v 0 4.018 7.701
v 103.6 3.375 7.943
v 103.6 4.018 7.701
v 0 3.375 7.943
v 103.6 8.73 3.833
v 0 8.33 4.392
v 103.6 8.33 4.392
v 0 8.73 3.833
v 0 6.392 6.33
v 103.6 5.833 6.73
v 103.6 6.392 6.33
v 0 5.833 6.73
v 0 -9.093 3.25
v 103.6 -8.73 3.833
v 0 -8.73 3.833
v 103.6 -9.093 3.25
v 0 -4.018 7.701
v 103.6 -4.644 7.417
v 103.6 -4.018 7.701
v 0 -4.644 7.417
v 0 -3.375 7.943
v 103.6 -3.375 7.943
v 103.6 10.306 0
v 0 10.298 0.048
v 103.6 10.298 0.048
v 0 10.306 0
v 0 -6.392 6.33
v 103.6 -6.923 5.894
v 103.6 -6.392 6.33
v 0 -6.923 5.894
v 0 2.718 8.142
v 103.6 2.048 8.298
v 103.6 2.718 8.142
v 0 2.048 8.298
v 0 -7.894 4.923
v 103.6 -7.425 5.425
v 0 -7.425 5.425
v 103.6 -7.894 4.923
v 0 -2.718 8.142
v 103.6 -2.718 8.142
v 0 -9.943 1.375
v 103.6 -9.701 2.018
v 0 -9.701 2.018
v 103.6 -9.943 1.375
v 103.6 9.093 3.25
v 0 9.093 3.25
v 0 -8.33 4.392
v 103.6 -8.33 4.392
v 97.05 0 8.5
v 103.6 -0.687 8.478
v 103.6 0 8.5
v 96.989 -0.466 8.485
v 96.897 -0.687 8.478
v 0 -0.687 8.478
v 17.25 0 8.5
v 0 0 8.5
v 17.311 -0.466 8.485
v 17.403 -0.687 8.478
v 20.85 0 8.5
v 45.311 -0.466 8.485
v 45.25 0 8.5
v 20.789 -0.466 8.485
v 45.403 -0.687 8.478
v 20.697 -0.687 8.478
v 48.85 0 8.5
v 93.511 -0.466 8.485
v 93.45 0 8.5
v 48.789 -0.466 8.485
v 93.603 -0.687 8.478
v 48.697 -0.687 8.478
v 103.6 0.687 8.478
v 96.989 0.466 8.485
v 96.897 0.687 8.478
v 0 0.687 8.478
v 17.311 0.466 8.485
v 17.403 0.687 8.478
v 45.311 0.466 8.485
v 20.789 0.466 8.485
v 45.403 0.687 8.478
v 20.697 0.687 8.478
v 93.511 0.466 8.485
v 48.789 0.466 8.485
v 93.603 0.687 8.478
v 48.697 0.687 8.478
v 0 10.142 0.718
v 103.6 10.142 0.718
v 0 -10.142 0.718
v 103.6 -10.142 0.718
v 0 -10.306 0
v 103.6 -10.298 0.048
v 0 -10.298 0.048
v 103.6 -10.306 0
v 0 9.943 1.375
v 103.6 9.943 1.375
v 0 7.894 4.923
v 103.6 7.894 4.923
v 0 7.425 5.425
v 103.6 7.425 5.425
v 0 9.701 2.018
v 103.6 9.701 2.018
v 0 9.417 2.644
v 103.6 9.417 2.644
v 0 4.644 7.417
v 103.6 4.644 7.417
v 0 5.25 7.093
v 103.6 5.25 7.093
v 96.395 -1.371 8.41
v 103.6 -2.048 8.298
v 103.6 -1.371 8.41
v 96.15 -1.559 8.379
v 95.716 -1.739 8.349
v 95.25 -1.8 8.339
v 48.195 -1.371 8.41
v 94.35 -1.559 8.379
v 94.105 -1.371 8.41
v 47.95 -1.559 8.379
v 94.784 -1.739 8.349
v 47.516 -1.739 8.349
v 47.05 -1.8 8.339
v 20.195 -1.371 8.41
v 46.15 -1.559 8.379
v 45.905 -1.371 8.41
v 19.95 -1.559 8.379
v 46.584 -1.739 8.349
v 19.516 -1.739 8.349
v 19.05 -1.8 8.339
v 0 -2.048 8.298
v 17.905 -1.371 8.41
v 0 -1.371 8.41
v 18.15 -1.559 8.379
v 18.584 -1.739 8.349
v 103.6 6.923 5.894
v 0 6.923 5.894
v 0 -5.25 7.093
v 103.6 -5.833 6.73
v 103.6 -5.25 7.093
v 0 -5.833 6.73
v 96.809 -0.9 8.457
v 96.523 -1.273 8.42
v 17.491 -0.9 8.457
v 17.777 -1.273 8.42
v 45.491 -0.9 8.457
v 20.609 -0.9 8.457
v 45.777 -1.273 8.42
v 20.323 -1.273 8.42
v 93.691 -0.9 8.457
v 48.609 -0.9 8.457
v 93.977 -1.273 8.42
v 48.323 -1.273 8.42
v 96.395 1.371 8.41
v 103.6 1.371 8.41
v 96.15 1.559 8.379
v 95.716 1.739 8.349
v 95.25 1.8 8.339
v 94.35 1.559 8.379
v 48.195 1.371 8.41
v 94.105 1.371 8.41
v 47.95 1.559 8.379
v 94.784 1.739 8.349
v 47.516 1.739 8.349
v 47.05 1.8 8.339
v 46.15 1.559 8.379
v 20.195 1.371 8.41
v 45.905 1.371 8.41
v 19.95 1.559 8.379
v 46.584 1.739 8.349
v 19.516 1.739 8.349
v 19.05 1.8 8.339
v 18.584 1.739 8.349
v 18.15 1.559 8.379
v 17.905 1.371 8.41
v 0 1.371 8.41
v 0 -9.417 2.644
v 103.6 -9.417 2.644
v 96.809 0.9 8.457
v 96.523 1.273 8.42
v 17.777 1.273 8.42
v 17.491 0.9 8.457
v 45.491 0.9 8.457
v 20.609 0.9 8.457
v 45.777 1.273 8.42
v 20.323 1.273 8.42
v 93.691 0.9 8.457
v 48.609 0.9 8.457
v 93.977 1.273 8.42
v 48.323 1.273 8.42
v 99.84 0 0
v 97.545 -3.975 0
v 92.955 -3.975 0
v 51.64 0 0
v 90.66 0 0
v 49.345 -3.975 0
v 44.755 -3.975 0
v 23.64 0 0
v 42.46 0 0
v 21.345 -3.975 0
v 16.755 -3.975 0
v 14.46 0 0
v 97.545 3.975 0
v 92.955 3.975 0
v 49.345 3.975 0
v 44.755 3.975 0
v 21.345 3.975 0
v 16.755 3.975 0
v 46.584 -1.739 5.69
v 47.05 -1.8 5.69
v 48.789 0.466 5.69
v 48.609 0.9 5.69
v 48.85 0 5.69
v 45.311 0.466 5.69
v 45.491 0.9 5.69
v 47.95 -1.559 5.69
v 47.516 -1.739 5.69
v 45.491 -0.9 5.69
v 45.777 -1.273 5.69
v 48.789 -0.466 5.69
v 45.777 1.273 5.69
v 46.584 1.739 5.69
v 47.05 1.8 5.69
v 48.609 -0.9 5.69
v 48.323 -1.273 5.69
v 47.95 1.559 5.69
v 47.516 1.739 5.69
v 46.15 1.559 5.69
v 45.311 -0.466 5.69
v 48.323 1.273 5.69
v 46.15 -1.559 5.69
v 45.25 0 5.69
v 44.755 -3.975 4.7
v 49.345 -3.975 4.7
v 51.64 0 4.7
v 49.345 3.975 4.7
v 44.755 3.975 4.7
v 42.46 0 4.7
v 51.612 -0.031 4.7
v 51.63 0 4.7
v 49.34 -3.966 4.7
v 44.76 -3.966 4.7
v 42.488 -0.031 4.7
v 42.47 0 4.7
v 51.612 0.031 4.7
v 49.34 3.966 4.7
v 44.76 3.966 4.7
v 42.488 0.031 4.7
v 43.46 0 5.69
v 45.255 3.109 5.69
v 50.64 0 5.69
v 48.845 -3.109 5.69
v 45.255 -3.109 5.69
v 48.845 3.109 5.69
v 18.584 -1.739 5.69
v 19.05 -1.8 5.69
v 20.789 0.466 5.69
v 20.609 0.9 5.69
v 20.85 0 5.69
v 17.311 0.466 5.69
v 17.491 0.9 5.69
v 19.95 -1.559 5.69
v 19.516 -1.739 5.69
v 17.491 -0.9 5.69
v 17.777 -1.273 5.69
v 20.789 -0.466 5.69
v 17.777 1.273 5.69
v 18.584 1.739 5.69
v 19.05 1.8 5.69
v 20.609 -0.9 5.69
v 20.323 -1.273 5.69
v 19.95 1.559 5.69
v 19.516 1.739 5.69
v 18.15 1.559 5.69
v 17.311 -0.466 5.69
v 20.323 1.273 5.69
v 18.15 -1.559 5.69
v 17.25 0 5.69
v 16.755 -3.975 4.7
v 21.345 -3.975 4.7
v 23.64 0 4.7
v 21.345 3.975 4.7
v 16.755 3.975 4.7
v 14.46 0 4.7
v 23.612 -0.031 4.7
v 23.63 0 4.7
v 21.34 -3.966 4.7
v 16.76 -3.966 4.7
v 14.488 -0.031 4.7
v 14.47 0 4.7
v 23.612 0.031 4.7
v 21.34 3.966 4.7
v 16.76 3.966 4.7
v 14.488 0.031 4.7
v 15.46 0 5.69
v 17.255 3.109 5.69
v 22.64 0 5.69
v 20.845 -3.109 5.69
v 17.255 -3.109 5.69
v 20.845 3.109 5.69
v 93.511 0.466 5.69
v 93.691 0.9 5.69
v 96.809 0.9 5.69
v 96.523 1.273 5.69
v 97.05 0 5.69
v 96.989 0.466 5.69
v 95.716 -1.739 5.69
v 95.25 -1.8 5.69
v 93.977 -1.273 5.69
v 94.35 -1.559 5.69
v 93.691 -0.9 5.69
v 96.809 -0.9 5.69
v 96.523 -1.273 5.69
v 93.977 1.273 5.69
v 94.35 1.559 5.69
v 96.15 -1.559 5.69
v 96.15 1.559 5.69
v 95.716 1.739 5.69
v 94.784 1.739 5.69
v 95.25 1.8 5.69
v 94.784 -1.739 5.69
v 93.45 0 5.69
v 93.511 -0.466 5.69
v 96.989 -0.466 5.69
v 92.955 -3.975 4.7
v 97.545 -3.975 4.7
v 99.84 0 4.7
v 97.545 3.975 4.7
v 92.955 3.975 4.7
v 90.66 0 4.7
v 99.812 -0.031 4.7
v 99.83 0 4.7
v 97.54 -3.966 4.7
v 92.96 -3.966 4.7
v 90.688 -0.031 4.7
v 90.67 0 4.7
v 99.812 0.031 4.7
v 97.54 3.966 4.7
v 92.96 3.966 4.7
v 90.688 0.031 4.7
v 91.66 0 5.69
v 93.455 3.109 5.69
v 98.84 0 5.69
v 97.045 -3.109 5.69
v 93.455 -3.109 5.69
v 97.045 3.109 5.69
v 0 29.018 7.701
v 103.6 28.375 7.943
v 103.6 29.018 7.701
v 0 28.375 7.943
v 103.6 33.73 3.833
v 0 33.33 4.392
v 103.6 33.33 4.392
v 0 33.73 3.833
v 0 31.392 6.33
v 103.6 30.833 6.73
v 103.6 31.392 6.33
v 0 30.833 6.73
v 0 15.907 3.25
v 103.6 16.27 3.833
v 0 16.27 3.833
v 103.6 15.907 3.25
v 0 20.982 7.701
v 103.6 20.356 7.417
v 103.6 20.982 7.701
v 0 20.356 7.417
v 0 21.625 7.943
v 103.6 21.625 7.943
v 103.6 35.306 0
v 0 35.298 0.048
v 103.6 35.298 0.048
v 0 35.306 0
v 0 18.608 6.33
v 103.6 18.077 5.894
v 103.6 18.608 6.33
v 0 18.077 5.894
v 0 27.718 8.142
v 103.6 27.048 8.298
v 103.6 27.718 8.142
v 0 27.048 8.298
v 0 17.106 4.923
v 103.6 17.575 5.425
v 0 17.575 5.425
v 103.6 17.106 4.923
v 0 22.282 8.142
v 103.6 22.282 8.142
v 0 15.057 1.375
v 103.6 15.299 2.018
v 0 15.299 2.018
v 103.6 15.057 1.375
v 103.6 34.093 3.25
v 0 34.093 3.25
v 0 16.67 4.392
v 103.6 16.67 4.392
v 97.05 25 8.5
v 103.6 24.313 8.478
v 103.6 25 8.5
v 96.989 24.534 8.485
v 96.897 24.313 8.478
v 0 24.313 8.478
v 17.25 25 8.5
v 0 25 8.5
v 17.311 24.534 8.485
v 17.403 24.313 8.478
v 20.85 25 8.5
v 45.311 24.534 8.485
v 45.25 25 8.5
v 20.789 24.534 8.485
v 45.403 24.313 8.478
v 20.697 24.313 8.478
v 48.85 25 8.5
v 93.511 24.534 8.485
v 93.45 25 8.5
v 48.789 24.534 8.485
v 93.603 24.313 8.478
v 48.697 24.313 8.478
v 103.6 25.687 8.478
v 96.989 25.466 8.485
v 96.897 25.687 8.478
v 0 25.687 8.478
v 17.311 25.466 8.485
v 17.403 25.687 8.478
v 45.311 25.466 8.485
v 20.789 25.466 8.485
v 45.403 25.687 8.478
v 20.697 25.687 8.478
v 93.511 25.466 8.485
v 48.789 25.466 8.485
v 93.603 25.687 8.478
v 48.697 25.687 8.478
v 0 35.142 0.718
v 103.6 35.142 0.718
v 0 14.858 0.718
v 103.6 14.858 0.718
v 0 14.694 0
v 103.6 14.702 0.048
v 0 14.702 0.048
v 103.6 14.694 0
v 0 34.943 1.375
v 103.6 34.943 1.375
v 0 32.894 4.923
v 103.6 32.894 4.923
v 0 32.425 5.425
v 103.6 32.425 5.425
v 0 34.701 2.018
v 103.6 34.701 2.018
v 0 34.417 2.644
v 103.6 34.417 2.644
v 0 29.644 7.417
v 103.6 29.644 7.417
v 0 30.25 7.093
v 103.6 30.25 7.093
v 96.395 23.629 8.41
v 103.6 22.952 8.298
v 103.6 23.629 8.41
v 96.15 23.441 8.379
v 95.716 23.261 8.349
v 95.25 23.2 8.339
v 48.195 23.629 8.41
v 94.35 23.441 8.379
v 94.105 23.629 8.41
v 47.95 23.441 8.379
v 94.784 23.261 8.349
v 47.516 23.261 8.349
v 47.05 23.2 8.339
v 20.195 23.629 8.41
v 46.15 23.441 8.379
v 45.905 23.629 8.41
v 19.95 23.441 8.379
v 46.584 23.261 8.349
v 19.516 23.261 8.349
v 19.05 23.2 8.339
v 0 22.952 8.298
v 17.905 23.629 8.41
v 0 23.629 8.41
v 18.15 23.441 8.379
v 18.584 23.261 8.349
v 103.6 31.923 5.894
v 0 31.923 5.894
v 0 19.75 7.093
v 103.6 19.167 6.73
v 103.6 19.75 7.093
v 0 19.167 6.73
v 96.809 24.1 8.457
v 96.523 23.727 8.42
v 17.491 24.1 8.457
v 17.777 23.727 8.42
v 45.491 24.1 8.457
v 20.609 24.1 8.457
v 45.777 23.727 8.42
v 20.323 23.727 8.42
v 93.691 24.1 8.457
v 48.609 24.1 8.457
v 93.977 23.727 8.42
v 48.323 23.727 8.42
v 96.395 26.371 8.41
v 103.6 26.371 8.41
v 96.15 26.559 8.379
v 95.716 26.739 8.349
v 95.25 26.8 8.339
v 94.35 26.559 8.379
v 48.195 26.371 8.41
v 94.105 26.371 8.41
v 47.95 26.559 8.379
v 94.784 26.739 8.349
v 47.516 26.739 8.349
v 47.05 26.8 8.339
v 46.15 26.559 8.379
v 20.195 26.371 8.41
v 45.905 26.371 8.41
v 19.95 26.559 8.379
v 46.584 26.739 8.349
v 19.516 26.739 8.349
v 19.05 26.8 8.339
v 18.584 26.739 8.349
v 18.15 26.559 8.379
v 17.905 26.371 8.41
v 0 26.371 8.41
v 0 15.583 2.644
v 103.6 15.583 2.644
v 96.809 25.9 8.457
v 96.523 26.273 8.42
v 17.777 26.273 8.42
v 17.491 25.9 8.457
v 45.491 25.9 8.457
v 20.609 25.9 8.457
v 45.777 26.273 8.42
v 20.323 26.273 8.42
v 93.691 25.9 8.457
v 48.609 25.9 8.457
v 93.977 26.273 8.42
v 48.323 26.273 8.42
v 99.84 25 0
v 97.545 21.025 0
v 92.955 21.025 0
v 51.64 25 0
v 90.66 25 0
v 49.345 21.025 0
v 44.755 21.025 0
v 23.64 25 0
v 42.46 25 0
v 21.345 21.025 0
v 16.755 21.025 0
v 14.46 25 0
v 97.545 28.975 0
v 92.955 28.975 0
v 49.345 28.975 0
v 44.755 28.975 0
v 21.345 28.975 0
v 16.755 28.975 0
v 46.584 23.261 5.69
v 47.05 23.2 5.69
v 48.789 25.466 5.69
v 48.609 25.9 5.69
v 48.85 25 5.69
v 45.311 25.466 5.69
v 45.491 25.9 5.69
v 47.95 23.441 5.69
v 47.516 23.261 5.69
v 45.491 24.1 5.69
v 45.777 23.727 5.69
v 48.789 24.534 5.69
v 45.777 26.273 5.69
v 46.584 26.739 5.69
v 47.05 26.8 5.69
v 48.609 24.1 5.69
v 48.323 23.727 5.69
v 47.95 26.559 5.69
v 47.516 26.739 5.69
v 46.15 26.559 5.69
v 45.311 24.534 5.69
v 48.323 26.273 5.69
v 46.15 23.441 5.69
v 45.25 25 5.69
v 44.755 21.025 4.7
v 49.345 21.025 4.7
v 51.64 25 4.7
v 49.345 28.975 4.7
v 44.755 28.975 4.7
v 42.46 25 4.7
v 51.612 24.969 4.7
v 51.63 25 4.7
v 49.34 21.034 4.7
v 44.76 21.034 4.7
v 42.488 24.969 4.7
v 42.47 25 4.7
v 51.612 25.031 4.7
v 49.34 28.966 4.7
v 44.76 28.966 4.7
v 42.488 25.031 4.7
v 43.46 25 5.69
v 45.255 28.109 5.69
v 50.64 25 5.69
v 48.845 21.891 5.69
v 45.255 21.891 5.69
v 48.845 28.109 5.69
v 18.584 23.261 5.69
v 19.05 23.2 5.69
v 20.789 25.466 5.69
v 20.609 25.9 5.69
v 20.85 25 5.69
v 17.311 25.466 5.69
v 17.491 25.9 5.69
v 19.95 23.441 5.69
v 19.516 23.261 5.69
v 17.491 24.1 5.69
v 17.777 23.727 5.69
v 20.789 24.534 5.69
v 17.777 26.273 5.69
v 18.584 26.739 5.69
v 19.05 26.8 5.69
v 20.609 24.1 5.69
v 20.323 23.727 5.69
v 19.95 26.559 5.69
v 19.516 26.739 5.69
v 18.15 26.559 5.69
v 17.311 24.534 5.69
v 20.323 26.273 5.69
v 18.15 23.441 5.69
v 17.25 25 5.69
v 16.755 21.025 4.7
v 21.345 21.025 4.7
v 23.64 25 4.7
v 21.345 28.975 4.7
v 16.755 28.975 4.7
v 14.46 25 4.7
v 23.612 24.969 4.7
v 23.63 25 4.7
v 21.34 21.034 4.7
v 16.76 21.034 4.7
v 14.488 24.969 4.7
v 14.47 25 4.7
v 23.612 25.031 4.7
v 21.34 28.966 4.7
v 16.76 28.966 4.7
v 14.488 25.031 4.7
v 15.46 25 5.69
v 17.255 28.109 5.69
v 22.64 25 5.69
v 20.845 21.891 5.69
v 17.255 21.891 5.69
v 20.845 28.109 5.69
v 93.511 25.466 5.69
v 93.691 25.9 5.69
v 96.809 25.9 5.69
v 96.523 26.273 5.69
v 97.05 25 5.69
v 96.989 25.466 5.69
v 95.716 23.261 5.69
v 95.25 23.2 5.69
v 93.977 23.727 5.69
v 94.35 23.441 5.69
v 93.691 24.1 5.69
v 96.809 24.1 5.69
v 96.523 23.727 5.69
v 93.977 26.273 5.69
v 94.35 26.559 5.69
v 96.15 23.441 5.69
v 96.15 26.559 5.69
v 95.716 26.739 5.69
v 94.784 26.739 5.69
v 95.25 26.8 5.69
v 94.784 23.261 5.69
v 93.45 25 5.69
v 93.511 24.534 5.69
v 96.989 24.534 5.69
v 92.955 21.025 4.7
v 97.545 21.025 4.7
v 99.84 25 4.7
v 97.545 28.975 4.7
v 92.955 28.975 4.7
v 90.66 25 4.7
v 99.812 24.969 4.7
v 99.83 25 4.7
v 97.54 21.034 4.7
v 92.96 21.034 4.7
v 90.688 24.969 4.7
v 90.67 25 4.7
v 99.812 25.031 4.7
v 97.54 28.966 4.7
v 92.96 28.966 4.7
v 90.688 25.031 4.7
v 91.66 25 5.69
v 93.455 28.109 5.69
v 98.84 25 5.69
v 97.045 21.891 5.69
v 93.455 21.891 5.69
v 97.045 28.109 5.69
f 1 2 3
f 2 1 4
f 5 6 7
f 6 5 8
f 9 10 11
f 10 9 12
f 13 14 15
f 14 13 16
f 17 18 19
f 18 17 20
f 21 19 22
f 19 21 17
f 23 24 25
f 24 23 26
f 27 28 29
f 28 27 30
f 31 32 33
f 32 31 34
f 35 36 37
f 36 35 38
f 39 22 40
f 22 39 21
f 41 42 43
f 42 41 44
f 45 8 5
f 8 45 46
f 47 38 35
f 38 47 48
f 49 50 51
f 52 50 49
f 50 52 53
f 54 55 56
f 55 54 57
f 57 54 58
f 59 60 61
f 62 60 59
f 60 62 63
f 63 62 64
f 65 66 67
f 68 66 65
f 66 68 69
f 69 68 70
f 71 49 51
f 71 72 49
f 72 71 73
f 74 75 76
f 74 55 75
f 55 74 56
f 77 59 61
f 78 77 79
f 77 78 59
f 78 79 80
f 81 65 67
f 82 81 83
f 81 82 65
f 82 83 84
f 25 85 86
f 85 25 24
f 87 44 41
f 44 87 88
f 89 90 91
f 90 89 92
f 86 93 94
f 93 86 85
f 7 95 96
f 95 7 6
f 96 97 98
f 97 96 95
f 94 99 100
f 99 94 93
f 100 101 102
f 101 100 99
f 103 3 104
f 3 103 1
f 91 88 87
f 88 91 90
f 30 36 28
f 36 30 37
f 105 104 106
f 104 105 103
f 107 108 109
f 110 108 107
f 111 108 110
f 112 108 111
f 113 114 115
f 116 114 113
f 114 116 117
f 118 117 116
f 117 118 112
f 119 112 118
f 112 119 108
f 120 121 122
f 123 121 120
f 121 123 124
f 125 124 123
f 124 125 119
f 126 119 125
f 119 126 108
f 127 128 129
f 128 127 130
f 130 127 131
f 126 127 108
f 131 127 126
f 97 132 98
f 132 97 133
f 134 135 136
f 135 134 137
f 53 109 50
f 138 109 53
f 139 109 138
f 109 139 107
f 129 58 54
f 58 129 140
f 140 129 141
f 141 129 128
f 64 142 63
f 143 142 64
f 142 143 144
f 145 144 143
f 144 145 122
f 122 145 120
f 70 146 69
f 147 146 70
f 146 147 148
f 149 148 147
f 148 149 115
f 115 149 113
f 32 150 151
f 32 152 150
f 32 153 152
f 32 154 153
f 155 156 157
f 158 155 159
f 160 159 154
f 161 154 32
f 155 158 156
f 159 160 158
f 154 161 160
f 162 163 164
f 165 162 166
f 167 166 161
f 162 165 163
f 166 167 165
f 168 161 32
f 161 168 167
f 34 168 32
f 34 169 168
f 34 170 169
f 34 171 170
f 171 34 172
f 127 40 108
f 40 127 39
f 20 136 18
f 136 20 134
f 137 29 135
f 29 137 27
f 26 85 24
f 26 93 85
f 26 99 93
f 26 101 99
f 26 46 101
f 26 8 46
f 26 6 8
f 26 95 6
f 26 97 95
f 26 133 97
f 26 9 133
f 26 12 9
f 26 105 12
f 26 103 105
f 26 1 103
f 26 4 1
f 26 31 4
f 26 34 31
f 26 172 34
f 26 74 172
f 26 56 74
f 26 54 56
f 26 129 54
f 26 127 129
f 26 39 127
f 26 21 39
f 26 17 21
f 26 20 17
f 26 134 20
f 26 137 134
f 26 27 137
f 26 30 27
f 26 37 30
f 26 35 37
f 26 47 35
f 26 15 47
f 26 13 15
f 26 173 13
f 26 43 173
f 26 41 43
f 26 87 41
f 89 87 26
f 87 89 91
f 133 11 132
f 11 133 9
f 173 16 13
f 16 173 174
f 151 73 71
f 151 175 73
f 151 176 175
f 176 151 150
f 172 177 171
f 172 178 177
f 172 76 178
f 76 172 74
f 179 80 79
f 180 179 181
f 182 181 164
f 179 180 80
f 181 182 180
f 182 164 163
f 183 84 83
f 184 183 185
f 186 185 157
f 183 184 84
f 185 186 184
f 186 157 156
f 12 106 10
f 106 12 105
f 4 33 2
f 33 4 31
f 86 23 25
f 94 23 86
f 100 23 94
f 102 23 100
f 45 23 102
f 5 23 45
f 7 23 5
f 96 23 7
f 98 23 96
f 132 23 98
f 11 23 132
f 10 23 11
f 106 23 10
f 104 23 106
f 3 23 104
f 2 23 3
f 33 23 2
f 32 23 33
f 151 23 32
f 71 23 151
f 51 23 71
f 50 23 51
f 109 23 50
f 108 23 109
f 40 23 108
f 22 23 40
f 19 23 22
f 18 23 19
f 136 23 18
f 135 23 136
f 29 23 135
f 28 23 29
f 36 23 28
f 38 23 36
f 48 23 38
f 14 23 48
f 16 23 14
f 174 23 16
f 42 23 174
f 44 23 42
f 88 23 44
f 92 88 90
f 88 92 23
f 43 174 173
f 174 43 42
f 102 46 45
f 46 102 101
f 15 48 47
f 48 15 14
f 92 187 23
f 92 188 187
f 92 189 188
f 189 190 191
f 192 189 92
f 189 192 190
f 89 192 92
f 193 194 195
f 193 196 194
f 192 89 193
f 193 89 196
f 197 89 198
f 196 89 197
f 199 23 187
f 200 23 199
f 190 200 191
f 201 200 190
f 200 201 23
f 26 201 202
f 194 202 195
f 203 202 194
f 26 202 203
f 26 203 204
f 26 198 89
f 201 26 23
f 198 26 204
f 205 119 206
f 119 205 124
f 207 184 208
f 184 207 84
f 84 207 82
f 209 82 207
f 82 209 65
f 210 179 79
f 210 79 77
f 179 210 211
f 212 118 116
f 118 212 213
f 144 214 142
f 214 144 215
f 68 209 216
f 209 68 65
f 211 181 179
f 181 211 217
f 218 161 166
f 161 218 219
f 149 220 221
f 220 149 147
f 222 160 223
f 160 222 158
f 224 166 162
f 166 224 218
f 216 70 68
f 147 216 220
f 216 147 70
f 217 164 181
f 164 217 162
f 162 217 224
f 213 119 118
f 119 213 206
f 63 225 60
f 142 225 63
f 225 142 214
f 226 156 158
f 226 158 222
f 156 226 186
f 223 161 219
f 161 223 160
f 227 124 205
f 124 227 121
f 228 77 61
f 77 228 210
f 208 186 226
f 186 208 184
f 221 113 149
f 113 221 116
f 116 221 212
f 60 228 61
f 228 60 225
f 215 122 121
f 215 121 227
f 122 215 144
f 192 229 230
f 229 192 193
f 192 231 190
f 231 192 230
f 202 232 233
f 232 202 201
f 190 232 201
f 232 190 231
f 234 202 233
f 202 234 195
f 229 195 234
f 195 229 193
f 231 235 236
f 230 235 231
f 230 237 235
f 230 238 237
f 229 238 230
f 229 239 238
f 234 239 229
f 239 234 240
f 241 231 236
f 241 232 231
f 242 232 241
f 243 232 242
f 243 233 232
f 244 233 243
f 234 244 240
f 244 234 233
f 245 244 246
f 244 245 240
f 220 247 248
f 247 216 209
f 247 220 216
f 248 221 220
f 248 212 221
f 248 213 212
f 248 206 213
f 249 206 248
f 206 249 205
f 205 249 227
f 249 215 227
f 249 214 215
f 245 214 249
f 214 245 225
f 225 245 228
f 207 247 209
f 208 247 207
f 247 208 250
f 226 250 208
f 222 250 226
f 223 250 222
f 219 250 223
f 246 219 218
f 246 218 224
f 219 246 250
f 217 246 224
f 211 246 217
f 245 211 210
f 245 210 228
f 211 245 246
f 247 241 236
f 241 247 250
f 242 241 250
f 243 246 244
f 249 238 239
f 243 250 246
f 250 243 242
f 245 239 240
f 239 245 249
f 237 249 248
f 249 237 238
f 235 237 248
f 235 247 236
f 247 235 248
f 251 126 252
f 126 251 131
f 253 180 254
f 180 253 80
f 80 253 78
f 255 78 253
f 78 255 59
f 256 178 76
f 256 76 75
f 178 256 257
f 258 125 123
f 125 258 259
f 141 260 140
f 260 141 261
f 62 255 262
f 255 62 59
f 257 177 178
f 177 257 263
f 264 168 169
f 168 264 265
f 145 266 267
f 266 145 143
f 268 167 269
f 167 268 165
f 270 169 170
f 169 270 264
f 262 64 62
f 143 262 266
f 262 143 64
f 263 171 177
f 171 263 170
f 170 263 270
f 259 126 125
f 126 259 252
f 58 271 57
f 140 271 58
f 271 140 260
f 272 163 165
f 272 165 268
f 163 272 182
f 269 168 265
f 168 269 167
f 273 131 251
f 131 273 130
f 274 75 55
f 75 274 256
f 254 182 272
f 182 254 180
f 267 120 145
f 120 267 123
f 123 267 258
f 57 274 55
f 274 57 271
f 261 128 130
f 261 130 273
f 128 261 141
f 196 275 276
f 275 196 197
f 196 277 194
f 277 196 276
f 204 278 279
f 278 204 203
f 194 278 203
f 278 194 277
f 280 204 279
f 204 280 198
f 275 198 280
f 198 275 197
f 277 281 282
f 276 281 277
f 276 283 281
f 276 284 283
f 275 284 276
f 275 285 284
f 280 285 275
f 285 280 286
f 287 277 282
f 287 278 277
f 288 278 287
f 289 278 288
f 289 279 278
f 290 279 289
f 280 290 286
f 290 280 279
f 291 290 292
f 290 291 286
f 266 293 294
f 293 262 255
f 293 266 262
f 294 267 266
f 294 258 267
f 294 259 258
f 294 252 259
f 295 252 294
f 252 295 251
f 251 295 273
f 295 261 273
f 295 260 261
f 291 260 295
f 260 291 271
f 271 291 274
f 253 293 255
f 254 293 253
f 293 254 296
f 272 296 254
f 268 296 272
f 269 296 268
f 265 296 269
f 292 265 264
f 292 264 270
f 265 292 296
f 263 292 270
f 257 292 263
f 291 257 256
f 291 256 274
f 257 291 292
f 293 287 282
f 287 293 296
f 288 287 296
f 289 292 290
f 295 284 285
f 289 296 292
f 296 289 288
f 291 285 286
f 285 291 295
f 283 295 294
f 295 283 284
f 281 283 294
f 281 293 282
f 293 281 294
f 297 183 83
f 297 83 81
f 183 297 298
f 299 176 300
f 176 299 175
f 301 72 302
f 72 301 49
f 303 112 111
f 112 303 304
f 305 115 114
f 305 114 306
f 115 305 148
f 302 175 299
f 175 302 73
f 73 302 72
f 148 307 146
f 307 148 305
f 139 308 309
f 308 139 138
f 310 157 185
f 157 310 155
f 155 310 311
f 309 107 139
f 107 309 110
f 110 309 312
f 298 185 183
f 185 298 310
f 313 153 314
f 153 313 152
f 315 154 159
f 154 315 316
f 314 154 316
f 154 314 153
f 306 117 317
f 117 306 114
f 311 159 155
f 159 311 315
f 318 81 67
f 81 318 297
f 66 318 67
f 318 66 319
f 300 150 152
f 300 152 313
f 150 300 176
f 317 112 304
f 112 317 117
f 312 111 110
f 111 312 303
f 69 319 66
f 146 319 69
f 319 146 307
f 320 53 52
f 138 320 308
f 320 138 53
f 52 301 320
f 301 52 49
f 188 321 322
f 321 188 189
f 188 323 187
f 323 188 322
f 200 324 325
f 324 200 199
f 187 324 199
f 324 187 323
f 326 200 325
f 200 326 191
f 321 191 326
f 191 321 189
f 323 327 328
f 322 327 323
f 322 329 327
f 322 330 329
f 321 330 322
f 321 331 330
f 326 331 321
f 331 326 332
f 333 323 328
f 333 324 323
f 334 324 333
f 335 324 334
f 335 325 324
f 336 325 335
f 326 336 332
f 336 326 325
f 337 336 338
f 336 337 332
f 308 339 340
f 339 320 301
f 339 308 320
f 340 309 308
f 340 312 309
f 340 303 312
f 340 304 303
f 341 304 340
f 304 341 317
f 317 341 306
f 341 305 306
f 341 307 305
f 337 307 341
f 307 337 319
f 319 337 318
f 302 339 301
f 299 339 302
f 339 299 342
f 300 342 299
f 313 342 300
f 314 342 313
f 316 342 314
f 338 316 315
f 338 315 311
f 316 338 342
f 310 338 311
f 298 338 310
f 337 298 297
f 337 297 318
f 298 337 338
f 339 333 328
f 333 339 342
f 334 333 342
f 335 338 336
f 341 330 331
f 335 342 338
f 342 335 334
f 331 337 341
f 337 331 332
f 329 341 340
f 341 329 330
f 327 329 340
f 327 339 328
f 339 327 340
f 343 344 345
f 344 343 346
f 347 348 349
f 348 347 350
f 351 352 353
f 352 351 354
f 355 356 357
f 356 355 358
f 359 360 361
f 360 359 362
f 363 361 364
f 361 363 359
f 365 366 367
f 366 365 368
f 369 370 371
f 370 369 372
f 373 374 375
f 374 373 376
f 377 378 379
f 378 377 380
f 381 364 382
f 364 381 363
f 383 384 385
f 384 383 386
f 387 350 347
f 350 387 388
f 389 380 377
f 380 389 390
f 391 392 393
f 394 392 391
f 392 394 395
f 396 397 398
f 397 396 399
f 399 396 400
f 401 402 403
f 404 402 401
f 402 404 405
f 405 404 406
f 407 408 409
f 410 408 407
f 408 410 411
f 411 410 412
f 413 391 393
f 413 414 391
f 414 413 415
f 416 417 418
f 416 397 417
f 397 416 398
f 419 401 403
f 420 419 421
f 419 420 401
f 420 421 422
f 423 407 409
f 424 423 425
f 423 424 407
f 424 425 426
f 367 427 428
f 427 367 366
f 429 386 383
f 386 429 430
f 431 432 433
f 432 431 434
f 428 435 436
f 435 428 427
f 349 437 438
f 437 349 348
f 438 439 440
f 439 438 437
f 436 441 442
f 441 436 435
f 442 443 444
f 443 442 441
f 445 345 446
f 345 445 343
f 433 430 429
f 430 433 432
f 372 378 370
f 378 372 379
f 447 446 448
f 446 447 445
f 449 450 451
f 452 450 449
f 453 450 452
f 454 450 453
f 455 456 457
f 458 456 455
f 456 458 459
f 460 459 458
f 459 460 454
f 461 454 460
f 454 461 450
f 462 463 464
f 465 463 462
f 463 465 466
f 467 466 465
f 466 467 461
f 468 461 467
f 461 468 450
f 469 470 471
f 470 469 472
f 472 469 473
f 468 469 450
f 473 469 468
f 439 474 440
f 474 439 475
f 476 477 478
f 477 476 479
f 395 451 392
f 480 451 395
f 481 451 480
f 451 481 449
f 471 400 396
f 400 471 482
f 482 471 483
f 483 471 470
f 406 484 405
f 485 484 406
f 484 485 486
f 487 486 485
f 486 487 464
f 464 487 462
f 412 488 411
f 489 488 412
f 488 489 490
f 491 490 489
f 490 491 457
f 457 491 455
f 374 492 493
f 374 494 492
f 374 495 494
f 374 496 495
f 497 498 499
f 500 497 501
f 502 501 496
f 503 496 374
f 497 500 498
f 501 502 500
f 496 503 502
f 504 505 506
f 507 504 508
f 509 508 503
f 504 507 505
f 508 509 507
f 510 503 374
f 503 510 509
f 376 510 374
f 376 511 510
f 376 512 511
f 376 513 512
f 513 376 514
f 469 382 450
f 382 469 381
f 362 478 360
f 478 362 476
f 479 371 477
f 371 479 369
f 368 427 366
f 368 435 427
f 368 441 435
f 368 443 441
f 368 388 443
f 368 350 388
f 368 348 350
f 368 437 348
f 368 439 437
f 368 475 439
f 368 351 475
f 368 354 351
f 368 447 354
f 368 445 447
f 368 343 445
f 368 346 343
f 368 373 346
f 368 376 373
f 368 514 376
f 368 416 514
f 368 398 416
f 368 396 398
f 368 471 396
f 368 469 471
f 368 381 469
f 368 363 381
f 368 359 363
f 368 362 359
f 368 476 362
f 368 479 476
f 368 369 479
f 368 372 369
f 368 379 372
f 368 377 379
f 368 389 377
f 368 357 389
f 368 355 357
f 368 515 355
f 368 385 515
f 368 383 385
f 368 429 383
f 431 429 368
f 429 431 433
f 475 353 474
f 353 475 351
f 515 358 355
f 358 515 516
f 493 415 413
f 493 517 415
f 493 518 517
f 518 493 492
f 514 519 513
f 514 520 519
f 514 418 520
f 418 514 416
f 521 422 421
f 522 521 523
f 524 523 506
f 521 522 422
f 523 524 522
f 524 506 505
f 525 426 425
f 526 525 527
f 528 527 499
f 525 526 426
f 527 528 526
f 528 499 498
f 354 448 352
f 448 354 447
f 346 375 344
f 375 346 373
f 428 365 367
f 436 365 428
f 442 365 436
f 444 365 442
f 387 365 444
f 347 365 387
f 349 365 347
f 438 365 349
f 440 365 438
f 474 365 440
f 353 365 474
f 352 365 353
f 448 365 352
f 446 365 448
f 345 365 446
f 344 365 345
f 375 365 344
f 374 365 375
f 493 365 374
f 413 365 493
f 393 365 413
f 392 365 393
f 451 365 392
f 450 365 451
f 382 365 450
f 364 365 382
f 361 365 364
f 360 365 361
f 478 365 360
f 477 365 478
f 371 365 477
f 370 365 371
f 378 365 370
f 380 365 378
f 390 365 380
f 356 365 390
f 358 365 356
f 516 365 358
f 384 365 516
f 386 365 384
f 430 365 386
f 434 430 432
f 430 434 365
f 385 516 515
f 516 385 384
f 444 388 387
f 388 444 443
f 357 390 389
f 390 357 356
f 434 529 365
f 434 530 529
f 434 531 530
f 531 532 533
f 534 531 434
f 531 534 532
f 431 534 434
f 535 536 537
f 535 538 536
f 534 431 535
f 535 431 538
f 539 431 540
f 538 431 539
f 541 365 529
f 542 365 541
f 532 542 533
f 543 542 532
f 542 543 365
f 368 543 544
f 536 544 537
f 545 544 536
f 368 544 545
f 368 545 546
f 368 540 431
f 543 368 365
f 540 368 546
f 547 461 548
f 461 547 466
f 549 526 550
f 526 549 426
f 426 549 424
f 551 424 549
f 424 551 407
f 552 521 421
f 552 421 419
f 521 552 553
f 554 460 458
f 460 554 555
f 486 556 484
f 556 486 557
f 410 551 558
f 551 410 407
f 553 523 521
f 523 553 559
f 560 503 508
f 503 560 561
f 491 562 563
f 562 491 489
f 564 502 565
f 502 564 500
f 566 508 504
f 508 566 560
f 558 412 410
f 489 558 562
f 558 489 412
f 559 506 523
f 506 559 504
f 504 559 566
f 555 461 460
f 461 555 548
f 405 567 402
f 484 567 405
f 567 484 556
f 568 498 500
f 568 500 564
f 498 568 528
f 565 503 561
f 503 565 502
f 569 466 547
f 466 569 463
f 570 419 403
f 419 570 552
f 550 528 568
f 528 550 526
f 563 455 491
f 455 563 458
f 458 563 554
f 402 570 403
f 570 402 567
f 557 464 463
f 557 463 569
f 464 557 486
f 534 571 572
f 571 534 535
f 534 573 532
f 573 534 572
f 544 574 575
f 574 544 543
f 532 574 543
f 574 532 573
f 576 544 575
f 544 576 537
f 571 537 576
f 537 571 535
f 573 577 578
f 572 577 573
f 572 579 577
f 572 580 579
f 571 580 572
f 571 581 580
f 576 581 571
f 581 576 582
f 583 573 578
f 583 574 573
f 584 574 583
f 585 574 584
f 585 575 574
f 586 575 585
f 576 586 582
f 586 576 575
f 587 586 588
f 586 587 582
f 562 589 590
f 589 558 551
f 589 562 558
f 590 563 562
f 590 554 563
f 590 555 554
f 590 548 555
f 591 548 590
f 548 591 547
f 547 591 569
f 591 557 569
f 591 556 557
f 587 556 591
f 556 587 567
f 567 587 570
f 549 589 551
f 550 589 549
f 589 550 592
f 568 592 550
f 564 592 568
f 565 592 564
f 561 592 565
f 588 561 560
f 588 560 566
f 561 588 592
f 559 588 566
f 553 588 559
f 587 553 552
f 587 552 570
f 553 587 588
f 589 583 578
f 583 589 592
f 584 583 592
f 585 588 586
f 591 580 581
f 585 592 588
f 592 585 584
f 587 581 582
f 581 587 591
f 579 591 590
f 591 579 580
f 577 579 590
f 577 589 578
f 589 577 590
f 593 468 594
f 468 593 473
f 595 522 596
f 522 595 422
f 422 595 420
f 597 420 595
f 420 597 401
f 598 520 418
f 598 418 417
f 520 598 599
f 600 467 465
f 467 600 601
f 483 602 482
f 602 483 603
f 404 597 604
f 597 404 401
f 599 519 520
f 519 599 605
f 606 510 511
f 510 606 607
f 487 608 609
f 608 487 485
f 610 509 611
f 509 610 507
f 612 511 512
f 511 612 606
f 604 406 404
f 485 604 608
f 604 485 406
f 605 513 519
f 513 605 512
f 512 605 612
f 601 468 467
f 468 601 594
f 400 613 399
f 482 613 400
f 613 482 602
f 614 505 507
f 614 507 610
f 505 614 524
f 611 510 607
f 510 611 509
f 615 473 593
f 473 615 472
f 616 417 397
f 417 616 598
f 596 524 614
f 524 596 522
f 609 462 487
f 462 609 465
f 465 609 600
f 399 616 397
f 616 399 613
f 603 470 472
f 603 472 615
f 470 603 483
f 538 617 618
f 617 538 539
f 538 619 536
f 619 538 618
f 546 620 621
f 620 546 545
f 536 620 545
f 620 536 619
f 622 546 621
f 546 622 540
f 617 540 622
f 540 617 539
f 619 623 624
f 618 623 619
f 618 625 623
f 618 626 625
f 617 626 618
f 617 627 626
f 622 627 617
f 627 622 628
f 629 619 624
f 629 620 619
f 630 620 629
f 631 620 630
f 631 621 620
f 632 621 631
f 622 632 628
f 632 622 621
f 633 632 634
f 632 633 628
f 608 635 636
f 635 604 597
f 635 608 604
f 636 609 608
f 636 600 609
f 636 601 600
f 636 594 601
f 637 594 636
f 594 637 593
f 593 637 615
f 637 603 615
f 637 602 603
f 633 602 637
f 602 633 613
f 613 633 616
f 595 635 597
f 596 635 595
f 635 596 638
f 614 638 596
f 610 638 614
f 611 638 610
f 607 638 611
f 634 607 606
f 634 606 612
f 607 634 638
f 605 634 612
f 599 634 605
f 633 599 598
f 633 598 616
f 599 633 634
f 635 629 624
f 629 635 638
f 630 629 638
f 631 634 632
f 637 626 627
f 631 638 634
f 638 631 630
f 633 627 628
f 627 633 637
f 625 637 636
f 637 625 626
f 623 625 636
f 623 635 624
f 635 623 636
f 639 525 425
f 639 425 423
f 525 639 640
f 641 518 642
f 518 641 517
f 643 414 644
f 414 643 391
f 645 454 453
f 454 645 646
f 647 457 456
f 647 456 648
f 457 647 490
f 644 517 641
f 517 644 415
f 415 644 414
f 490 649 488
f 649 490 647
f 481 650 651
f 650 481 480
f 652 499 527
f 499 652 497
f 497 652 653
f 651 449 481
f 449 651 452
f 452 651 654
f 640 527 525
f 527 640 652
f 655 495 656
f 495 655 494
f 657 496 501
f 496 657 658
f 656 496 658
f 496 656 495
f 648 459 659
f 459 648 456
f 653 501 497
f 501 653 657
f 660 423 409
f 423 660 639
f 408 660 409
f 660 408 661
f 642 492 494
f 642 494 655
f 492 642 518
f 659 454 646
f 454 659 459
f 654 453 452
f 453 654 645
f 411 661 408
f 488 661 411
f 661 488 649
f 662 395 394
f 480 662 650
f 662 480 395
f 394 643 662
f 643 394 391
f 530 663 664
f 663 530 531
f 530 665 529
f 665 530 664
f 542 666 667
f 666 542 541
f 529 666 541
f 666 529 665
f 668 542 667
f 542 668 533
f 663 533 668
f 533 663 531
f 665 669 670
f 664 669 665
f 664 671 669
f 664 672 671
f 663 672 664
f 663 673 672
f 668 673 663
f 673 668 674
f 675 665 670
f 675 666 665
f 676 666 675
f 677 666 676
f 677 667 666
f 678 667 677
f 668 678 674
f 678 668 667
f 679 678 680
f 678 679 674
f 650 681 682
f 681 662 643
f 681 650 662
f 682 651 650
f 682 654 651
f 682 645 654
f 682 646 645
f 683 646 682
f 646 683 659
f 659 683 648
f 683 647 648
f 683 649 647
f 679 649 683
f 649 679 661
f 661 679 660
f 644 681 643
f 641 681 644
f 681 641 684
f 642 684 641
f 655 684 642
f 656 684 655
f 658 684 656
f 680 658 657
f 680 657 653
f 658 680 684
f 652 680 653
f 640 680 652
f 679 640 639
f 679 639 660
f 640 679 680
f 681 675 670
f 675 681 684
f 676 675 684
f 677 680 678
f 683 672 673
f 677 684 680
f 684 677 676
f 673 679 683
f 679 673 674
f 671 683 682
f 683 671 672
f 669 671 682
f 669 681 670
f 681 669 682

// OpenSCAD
//Parametric Nut trap for Mostly Printed CNC Router
//July 7,2015 By: David Bunch
//
//Revised 9/21/2015 to allow for 3 nuts
//I needed to make a length that would fit with my customized tool holder for
//a Mastergrip rotary tool I bought at Costco years ago, so I decided to make it parametric.
//Spacing for my tool holder is 53mm distance between holes

//Even though this is for the U.S. Standard Version, I use mm for dimensions
//
//Designed for Bosch Toolholder with Dust cover using 2 parts
//76.25mm 1st & 3rd hole
//28.01mm 1st & 2nd hole
//48.24mm 2nd & 3rd hole

//CUSTOMIZER VARIABLES

//1. Number of Nuts
NumNuts = 3;    //usually 2, but need 3 for Bosch with Vac attachment

//2. Spacing between 1st & Last Nut
NutSpacing=76.2;     //mm spacing between Nuts (original design seems to be 76.2mm)

//3. Spacing between 1st & 2nd Nut
NutSpacing2 = 28;    //Use 0 if only using 2 nuts

//4. Diameter of Nut Holder (21mm is U.S. Version Size)
THNT_Dia=21;      //Dia Tool Holder Nut Trap

//5. Resolution of Nut Holder (96 gives you about .7mm length segments in curve)
ires=96;    //Number of  segments for Tool Holder
                    //Circumference of 21mm Dia circle is 65.97
                    //Making each segment about .7mm will give you 96 for the number of sides

//6. Diameter of Bolt Threading
M3Dia=3.6;             //Dia. of Hole

//7. Resolution of Bolt Threads (24 gives .47mm length segments in curve)
M3_ires=24;         //Number of segments for M3 holes (.47mm segments)
                    //original design was 180 sides (.06mm segments)
//8. Diameter of Nut
M3NutDia=9.18;

//9. Height of Nut trap
M3Nut_Ht=4.7;

//10. Offset from Left for 1st Nut Trap
LtNutOffset=19.05;      //Original Design is 19.05mm

//11. Offset from Right of 2nd Nut Trap (Original is 6.35mm)
RtNutOffset=8.35;       //(I decided to add 2mm to this gap)

//12. Rotation of Nut Trap (0 = Original or 30 = Nut face parallel with End)
RotNut=0;	//	[0:Original, 30:parallel with End]

//13. Print 1 or 2 Nut Traps
Qty=2;

//14. Change this number to make it thicker or thinner
Z_Origin=-2;      //Z origin of Nut trap profile cylinder to extrude
//CUSTOMIZER VARIABLES END

//----------------------------------------

Len=LtNutOffset+RtNutOffset+NutSpacing;     //Total Length of Nut Trap
echo("Len = ",Len);
RtNut_X=Len-RtNutOffset;
//Len=101.6;   //Original Tool Holder Nut Trap length was 101.6
Cube_z=(Z_Origin + 30)* (-1);
module Base()
{
    difference()
    {
        translate([0,0,Z_Origin])
        rotate([0,90,0])
        cylinder(d=THNT_Dia,h=Len,$fn=ires);
        translate([-1,-15,-30])
        cube([Len+2,30,30]);
    }
}
module DrawFinal()
{
    difference()
    {
        Base();
//Drill the Left Bolt Hole
        translate([LtNutOffset,0,-1])
        cylinder(d=M3Dia,h=12,$fn=M3_ires);
        if (NumNuts == 3)
        {
            if (NutSpacing2 > 0)
            {
                translate([LtNutOffset+NutSpacing2,0,-1])
                cylinder(d=M3Dia,h=12,$fn=M3_ires);
                translate([LtNutOffset+NutSpacing2,0,-1])
        rotate([0,0,RotNut])
                cylinder(d=M3NutDia,h=M3Nut_Ht+1,$fn=6);
                translate([LtNutOffset+NutSpacing2,0,M3Nut_Ht-.01])
        rotate([0,0,RotNut])            //Rotate Nut either 0 or 30
        cylinder(d1=M3NutDia,d2=M3NutDia-2,h=1,$fn=6);
            }
        }
//Cut Left Nut Trap
        translate([LtNutOffset,0,-1])
        rotate([0,0,RotNut])            //Rotate Nut either 0 or 30
                                        //rotating 30 gives more plastic between Nut and end
        cylinder(d=M3NutDia,h=M3Nut_Ht+1,$fn=6);        //6 sided Nut trap hole
        translate([LtNutOffset,0,M3Nut_Ht-.01])
        rotate([0,0,RotNut])            //Rotate Nut either 0 or 30
        cylinder(d1=M3NutDia,d2=M3NutDia-2,h=1,$fn=6);  //Add slight taper for nut hole
//Drill the Right Bolt Hole
        translate([RtNut_X,0,-1])
        cylinder(d=M3Dia,h=12,$fn=M3_ires);
//Cut Right Nut Trap
        translate([RtNut_X,0,-1])
        rotate([0,0,RotNut])            //Rotate Nut either 0 or 30
        cylinder(d=M3NutDia,h=M3Nut_Ht+1,$fn=6);        //6 sided Nut trap hole
        translate([RtNut_X,0,M3Nut_Ht-.01])
        rotate([0,0,RotNut])            //Rotate Nut either 0 or 30
        cylinder(d1=M3NutDia,d2=M3NutDia-2,h=1,$fn=6);  //Add slight taper for nut hole
    }
}
DrawFinal();
if (Qty == 2)
{
    translate([0,25,0])
    DrawFinal();
}
